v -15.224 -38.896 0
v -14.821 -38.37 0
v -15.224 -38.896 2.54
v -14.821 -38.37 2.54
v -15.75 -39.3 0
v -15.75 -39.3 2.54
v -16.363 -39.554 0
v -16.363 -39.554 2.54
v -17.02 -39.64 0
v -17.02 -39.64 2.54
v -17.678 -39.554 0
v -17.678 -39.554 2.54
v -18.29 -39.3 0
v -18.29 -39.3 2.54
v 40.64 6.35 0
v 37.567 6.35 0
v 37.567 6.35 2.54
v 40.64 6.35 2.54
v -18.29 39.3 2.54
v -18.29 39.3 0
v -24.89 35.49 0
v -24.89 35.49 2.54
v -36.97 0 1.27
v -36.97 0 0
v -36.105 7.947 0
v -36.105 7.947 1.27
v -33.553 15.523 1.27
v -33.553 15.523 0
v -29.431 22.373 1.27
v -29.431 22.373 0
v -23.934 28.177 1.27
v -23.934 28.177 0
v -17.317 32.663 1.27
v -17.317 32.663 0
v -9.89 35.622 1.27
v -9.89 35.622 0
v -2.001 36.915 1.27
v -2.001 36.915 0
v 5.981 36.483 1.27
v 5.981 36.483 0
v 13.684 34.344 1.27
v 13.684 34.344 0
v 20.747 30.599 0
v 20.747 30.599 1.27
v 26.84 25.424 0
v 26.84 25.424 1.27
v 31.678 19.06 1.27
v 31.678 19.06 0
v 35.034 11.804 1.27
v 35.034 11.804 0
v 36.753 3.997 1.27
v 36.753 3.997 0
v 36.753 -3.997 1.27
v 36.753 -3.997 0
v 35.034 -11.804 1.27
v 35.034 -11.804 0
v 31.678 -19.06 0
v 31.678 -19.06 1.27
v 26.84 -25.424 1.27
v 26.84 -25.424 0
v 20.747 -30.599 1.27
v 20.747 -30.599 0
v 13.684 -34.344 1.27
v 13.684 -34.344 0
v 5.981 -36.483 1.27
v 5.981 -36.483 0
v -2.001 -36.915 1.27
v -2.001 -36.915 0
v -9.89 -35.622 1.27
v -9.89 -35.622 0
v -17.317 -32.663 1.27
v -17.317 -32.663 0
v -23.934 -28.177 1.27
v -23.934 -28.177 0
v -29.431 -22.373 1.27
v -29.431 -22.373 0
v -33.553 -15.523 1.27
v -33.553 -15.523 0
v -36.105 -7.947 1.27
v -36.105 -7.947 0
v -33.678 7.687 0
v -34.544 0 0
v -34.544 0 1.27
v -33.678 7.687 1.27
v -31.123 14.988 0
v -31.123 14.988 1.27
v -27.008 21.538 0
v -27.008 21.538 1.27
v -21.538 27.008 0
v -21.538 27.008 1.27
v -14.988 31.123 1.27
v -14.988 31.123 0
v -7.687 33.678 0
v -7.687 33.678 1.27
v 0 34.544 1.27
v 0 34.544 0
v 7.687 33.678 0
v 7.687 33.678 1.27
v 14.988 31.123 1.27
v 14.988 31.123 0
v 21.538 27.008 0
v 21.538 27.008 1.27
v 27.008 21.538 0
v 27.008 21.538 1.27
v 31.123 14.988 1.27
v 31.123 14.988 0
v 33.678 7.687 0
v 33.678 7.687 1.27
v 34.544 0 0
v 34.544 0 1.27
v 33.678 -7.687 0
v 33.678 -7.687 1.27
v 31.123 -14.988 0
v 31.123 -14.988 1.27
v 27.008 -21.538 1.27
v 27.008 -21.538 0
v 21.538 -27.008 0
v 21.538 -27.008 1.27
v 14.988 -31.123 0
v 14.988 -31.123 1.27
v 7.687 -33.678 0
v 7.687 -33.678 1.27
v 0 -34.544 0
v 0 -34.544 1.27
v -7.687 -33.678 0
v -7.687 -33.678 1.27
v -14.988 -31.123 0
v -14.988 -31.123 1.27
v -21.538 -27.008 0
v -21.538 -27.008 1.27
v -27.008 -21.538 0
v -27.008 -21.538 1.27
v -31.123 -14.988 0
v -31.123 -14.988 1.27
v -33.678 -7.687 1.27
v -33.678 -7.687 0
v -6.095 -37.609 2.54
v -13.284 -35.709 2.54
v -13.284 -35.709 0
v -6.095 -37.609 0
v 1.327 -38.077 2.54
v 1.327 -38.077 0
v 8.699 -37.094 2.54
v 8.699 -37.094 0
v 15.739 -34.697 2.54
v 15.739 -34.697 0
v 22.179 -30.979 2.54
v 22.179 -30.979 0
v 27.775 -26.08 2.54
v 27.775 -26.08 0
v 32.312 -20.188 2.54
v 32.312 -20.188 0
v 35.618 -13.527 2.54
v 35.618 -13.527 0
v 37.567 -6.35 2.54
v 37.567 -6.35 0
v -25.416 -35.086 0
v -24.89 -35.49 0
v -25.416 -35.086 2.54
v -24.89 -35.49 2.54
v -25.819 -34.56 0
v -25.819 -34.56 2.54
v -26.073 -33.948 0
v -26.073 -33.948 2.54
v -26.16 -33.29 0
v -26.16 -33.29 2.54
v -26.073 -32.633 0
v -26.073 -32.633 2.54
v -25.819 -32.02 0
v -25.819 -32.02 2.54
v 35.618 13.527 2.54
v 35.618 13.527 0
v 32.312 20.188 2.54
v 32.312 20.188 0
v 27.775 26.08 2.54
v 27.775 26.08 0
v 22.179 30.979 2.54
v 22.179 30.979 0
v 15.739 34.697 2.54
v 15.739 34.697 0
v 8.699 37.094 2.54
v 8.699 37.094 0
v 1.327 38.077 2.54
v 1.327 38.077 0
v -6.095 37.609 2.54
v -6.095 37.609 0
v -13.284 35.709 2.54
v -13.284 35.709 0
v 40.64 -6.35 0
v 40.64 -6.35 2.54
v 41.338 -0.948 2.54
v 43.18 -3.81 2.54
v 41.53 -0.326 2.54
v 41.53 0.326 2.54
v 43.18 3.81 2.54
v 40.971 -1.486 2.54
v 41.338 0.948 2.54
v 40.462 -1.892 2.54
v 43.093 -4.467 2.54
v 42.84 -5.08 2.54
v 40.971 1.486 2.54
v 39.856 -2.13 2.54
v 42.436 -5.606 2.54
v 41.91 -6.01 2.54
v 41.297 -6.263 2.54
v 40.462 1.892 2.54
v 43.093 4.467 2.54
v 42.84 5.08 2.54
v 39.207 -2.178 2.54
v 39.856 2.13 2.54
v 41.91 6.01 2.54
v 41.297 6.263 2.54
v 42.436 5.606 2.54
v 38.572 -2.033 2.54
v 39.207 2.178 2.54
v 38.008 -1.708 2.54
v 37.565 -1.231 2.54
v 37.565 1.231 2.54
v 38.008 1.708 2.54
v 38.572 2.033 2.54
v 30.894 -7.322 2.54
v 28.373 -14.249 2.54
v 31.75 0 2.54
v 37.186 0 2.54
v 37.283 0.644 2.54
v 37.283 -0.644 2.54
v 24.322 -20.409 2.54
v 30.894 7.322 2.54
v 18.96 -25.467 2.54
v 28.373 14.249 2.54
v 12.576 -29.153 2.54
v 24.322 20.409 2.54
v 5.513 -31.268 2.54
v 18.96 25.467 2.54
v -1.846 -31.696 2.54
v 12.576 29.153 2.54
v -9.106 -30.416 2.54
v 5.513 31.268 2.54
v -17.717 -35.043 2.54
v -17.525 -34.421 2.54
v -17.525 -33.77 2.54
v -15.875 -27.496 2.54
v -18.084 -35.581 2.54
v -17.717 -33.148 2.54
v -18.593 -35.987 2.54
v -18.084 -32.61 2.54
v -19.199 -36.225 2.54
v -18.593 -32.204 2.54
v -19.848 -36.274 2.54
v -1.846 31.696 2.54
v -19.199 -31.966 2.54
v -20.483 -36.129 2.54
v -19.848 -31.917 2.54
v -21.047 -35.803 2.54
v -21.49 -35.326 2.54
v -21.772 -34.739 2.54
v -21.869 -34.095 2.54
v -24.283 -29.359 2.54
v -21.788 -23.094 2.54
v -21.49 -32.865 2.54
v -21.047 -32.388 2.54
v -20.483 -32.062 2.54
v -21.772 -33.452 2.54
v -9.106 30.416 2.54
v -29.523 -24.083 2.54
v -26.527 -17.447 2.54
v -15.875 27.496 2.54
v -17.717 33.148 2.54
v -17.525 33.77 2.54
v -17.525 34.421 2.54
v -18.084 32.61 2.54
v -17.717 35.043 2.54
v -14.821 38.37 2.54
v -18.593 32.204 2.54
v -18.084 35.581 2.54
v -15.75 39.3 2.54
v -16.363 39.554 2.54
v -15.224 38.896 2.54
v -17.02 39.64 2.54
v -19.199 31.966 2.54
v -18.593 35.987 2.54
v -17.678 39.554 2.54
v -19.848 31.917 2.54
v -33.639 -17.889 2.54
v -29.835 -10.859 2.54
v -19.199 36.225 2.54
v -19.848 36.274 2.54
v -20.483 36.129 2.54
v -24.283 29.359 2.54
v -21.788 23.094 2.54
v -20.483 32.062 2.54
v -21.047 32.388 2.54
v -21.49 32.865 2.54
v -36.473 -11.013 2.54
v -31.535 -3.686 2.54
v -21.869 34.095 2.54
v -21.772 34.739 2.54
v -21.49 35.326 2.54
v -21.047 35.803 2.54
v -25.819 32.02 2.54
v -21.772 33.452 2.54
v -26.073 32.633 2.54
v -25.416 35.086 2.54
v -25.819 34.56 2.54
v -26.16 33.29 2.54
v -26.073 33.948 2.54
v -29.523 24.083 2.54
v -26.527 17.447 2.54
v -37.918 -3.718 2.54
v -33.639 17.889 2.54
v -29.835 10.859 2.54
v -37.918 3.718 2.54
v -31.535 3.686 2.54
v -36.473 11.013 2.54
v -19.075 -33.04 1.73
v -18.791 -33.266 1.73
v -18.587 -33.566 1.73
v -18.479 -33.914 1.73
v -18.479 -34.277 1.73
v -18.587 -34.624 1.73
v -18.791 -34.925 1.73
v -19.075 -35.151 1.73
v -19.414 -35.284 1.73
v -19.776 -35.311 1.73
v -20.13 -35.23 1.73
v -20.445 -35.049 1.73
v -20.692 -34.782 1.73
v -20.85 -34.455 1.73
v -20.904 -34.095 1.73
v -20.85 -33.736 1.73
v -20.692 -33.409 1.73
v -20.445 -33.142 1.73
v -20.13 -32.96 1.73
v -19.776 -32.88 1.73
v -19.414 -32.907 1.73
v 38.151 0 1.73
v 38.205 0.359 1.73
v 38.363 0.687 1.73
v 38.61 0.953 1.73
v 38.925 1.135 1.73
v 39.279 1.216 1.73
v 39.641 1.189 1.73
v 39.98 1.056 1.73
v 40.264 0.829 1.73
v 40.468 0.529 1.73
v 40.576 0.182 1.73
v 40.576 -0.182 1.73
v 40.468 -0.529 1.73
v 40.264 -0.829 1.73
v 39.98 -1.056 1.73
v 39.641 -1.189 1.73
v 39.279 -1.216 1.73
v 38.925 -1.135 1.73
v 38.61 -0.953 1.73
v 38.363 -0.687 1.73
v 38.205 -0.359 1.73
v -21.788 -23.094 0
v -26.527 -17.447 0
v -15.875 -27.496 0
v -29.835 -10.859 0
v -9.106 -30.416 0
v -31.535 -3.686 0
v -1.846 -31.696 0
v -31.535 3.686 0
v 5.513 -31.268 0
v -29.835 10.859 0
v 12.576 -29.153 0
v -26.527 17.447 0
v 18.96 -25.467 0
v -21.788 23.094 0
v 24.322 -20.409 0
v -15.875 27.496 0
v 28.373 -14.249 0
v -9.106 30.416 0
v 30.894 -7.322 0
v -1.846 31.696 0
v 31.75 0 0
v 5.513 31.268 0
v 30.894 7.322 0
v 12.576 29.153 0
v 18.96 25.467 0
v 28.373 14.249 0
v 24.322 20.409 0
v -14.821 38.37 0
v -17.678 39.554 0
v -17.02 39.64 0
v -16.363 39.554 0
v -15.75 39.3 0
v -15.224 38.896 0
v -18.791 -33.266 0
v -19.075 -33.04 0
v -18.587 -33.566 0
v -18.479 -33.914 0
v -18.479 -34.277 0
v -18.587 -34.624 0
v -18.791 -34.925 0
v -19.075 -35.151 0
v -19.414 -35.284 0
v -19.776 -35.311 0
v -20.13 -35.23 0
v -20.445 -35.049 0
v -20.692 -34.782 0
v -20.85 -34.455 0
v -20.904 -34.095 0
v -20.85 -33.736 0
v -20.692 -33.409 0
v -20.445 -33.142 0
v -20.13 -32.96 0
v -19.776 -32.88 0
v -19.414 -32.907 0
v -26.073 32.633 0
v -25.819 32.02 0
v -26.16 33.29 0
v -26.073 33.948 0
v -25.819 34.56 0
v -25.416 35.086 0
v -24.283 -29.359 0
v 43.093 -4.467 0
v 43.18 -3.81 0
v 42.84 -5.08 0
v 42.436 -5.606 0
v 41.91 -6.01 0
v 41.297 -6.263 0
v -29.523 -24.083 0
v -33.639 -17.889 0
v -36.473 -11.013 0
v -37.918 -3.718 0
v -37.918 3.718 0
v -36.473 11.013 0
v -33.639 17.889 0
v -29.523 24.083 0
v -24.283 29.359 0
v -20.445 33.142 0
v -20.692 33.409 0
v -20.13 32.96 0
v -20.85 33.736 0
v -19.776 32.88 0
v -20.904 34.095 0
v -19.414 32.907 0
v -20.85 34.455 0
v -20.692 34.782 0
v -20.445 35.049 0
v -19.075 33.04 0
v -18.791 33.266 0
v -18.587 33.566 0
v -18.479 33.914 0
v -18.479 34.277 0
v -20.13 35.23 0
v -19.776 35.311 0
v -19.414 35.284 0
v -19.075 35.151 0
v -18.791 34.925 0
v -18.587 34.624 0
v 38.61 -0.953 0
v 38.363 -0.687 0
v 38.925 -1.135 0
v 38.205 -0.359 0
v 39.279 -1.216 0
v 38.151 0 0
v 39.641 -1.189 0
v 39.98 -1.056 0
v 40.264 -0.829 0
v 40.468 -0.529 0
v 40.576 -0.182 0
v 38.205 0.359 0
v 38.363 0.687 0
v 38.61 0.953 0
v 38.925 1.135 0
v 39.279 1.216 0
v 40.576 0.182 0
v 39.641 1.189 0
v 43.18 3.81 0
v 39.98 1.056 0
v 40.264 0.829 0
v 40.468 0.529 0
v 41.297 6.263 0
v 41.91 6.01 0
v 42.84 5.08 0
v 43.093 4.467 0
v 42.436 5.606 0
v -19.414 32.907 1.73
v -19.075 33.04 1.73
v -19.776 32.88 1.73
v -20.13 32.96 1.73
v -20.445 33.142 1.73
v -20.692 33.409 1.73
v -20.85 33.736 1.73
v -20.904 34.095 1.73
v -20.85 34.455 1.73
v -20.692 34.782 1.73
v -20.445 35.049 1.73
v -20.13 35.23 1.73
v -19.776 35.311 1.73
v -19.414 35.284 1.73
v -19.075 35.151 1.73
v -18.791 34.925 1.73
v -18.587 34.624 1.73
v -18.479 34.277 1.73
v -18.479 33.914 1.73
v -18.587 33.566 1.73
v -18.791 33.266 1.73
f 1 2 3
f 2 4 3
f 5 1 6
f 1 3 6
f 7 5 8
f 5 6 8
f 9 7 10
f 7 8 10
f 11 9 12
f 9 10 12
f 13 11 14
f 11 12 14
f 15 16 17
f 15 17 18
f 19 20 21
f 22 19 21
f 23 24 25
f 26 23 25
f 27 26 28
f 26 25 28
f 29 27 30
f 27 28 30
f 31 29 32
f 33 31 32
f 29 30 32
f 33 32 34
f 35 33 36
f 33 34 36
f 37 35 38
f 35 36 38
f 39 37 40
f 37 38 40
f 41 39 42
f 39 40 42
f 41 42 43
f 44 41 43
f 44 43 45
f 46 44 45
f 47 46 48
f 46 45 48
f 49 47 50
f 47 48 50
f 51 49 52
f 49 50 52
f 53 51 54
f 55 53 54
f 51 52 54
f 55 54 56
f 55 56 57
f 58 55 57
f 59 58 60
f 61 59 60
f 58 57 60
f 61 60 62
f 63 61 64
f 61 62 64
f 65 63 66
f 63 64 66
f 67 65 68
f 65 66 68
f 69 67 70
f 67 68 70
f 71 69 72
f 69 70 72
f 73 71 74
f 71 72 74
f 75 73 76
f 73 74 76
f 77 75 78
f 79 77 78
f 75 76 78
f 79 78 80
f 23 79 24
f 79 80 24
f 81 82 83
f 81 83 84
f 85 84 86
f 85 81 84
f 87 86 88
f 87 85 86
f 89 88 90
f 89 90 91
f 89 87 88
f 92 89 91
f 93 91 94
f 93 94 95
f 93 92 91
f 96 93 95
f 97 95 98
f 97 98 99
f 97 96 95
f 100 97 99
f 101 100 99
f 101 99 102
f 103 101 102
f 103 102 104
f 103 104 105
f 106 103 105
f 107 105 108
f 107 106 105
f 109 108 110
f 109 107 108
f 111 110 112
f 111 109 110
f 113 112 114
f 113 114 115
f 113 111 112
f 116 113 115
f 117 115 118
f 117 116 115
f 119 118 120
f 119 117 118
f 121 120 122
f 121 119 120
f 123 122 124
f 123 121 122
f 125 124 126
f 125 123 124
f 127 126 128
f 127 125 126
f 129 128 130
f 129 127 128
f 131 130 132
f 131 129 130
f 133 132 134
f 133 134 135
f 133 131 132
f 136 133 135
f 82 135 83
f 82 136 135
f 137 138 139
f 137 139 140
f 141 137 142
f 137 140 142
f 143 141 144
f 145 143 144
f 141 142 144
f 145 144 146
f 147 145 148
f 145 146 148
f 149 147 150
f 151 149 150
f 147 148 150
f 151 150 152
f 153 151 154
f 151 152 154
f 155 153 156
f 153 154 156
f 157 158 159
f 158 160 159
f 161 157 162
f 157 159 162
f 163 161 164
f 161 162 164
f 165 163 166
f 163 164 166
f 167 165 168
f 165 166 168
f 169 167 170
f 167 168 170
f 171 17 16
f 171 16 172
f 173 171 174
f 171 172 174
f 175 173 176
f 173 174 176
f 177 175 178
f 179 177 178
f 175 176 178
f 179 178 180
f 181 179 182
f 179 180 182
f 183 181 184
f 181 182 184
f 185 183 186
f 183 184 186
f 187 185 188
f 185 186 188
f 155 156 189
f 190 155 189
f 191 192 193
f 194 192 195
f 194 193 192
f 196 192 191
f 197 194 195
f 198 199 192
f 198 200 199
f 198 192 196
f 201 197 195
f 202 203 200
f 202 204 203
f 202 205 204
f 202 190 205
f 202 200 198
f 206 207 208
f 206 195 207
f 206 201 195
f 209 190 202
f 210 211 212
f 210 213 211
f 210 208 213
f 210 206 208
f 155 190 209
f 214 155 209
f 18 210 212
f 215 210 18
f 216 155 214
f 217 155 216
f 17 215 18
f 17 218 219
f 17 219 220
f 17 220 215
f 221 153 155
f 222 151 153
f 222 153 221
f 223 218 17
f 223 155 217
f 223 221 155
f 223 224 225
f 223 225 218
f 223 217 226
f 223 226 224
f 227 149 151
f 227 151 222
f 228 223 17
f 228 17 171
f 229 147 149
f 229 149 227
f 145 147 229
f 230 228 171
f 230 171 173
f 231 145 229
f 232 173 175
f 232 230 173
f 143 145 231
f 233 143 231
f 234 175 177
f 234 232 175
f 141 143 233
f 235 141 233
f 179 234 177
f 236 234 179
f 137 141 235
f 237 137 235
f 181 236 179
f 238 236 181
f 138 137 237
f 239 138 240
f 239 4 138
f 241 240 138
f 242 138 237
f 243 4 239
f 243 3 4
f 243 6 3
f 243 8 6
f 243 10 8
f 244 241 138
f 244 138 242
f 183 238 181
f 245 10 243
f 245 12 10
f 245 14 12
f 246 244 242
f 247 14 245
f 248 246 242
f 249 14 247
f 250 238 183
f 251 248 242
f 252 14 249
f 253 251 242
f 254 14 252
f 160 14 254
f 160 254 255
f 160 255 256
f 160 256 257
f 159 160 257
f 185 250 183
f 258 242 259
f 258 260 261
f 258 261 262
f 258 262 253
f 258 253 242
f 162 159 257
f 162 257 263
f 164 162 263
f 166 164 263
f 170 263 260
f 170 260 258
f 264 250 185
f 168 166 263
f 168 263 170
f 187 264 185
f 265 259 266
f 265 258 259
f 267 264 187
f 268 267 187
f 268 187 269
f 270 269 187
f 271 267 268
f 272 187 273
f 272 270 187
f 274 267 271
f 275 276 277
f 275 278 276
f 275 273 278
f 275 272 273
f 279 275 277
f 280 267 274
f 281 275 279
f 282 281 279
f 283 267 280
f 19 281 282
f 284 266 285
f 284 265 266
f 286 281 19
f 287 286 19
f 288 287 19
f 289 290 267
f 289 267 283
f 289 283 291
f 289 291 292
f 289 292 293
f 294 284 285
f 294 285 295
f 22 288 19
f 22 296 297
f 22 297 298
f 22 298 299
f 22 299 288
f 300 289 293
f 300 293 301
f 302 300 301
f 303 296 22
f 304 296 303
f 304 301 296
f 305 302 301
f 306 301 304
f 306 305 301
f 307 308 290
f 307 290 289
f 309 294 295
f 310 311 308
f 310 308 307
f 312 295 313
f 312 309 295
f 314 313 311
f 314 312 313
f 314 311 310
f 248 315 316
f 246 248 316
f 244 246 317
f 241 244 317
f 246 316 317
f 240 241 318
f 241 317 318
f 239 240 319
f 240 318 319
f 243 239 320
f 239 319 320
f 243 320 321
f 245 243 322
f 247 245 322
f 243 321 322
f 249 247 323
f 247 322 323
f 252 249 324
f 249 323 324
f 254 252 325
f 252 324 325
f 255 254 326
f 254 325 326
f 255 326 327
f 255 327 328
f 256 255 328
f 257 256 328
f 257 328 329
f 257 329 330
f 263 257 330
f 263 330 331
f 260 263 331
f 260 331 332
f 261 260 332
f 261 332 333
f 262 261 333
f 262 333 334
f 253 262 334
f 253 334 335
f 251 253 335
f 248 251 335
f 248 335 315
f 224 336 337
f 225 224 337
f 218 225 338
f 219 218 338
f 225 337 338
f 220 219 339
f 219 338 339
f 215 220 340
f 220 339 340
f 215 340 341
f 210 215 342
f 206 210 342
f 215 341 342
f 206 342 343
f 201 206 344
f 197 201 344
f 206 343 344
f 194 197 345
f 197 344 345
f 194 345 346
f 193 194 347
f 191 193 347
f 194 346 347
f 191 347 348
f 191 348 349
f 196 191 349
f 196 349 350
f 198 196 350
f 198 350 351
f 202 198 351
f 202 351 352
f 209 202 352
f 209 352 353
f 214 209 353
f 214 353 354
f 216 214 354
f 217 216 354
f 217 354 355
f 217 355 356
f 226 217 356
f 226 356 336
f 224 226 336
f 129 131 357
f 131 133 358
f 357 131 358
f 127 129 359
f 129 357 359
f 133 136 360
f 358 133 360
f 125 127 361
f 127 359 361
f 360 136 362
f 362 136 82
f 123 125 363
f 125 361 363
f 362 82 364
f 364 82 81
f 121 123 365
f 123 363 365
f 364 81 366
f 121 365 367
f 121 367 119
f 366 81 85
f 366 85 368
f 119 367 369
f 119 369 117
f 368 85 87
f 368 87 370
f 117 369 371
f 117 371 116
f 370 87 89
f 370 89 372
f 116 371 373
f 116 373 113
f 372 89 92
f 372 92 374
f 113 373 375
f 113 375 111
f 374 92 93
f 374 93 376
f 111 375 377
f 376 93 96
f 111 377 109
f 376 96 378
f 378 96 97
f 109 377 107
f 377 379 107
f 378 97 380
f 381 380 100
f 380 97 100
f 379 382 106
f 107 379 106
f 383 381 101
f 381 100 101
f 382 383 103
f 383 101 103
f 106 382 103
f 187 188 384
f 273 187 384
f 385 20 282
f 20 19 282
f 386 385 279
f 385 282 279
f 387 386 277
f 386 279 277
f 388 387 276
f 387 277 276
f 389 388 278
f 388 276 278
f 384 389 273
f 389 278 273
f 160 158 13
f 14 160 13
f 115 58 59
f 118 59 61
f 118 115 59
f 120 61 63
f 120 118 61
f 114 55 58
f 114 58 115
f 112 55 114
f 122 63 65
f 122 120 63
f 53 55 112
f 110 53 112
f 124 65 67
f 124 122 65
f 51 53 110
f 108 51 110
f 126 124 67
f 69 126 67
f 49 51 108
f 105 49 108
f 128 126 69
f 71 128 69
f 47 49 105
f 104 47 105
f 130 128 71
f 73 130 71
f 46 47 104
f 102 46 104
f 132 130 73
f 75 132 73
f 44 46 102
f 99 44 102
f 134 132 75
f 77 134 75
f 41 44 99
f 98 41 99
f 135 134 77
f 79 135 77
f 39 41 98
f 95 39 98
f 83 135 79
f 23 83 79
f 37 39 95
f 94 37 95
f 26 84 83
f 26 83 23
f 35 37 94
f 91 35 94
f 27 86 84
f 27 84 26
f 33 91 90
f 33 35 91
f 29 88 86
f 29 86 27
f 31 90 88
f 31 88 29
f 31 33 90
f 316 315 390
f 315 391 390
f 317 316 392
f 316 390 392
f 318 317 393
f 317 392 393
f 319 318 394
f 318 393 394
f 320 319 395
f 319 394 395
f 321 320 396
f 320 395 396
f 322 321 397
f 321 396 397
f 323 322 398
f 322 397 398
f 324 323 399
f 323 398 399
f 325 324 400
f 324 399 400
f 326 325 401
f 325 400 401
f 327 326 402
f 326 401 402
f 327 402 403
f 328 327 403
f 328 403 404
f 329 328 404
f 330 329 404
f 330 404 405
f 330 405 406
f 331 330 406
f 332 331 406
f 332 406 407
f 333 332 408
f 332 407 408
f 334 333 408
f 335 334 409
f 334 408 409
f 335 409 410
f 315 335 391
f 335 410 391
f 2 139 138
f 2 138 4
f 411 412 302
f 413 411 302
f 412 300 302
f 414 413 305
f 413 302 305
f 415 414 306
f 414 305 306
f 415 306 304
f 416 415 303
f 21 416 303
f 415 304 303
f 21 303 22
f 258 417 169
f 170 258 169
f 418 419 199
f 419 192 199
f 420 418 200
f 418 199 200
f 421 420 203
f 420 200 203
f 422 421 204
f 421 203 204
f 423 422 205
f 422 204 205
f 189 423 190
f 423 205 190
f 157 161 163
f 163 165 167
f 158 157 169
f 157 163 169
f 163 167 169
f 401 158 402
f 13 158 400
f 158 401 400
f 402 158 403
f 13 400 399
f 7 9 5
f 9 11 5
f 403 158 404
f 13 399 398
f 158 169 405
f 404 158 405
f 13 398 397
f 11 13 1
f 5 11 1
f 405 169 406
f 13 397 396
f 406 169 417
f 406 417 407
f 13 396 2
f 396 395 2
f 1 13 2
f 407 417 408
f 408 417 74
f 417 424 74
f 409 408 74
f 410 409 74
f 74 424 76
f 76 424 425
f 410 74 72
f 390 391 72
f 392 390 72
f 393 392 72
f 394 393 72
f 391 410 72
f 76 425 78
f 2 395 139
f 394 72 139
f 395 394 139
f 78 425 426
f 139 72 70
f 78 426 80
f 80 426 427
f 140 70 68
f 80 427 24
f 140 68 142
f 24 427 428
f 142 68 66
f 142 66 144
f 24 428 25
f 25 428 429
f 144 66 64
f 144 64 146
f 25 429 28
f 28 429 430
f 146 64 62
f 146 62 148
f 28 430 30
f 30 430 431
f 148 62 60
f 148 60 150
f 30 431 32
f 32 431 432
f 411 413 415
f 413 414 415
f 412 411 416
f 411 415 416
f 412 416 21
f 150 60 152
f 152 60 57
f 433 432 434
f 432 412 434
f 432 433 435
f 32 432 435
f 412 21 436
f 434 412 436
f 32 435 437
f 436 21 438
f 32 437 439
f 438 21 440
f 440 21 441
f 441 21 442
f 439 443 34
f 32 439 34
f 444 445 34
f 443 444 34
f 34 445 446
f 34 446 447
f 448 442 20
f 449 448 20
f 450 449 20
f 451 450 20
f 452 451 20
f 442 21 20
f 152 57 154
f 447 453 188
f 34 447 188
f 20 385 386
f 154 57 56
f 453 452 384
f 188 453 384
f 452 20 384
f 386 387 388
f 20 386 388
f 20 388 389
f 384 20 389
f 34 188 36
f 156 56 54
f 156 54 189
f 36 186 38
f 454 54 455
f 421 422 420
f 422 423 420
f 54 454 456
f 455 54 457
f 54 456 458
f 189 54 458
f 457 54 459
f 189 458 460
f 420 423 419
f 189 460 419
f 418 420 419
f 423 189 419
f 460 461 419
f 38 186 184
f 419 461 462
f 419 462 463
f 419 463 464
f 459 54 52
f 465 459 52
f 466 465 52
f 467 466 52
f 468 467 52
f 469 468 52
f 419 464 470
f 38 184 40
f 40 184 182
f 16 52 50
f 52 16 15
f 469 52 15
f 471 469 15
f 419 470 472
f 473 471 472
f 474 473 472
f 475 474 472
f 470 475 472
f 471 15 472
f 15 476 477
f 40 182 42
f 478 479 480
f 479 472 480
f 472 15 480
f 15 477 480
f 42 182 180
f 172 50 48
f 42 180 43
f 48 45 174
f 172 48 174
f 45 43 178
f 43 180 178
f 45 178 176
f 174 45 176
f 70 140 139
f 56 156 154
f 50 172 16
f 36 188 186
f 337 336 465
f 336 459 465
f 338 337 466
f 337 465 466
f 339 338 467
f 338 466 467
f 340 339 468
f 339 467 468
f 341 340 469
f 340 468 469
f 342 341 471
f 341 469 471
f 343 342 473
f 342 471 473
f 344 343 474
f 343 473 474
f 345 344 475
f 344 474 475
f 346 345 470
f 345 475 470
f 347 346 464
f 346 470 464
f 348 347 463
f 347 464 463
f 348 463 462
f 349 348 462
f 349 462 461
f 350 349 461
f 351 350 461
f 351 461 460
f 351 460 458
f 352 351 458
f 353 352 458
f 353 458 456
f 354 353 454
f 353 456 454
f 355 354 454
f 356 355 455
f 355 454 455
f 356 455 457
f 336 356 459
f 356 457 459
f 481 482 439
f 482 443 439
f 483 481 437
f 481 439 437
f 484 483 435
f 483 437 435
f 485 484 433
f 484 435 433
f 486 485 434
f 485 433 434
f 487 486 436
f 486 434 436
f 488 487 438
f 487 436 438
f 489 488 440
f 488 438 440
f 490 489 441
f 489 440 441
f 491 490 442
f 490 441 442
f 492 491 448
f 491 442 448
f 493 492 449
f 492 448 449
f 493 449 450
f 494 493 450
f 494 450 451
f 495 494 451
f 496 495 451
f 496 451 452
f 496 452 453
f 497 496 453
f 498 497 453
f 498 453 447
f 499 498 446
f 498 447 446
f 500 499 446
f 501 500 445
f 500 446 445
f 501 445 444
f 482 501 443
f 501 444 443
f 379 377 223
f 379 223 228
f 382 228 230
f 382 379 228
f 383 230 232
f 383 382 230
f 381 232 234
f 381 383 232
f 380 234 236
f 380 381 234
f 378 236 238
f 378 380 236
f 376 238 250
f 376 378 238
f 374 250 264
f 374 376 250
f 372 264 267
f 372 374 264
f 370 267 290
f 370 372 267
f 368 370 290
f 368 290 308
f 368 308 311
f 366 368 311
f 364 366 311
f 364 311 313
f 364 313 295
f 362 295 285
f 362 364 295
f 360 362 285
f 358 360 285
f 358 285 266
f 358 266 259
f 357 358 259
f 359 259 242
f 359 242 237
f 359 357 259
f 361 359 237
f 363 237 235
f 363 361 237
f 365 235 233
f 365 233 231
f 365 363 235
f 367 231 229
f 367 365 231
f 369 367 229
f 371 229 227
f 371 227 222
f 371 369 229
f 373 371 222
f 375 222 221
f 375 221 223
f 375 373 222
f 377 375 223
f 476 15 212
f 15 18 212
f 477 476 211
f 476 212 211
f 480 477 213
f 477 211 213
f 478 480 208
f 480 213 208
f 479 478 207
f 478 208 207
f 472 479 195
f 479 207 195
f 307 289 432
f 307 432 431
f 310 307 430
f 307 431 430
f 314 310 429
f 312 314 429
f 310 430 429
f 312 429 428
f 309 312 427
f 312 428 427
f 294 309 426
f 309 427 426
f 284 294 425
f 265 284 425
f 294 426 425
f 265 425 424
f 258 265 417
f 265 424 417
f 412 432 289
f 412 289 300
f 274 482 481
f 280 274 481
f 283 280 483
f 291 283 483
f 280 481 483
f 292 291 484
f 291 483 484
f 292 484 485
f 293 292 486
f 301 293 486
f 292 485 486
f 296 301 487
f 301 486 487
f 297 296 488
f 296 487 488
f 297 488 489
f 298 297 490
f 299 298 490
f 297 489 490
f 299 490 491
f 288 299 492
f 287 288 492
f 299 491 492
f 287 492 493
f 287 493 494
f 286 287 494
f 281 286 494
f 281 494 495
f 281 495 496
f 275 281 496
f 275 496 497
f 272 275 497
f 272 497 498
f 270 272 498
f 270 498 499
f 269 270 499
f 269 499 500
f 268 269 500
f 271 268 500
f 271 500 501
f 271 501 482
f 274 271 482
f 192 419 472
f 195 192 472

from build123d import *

# Parameters (mm, degrees)
SKETCH1_R                                         = 38.1
SKETCH1_R_2                                       = 31.75
BOSS_EXTRUDE1_DEPTH                               = 2.54
SKETCH2_W                                         = 10.16
SKETCH2_H                                         = 12.7
BOSS_EXTRUDE2_DEPTH                               = 2.54
FILLET1_R                                         = 2.54
SKETCH3_R                                         = 0.635
CUT_EXTRUDE1_DEPTH                                = 3.54
CSK_FOR_2_FLAT_HEAD_MACHINE_SCREW_100_D           = 2.4384
CSK_FOR_2_FLAT_HEAD_MACHINE_SCREW_100_CSINK_D     = 4.3688
CSK_FOR_2_FLAT_HEAD_MACHINE_SCREW_100_CSINK_ANGLE = 100
CIRPATTERN1_COUNT                                 = 3
FILLET1_OF_CIRPATTERN1_R                          = 2.54
SKETCH6_R                                         = 36.9697
SKETCH6_R_2                                       = 34.544
CUT_EXTRUDE3_DEPTH                                = 1.27


with BuildPart() as part:
    # Sketch1 → Boss-Extrude1 (new body)
    with BuildSketch(Plane.XY):
        Circle(SKETCH1_R)
        Circle(SKETCH1_R_2, mode=Mode.SUBTRACT)
    extrude(amount=BOSS_EXTRUDE1_DEPTH)

    # Sketch2 → Boss-Extrude2 (add)
    with BuildSketch(Plane.XY):
        with Locations((38.1, 0)):
            Rectangle(SKETCH2_W, SKETCH2_H)
    boss_extrude2 = extrude(amount=BOSS_EXTRUDE2_DEPTH)

    # Fillet1
    fillet1_edges = [part.edges().sort_by_distance(p)[0] for p in [
        (43.18, 6.35, 1.27),
        (43.18, -6.35, 1.27),
    ]]
    fillet(fillet1_edges, radius=FILLET1_R)

    # Sketch3 → Cut-Extrude1 (cut, through all)
    with BuildSketch(Plane.XY.offset(2.54)):
        with Locations((39.37, 0)):
            Circle(SKETCH3_R)
    cut_extrude1 = extrude(amount=-CUT_EXTRUDE1_DEPTH, mode=Mode.SUBTRACT)

    # CSK for #2 Flat Head Machine Screw (100)1 (through all)
    with Locations(Plane.XY.offset(2.54)):
        with Locations((39.37, 0)):
            csk_for_2_flat_head_machine_screw_100 = CounterSinkHole(CSK_FOR_2_FLAT_HEAD_MACHINE_SCREW_100_D / 2, CSK_FOR_2_FLAT_HEAD_MACHINE_SCREW_100_CSINK_D / 2, counter_sink_angle=CSK_FOR_2_FLAT_HEAD_MACHINE_SCREW_100_CSINK_ANGLE)

    # CirPattern1: Boss-Extrude2, Cut-Extrude1, CSK for #2 Flat Head Machine Screw (100)1 ×3 about axis
    cirpattern1_axis = Axis((0, 0, 0), (0, 0, 1))
    for i in range(1, CIRPATTERN1_COUNT):
        add(boss_extrude2.rotate(cirpattern1_axis, i * 360 / CIRPATTERN1_COUNT))
        add(cut_extrude1.rotate(cirpattern1_axis, i * 360 / CIRPATTERN1_COUNT), mode=Mode.SUBTRACT)
        add(csk_for_2_flat_head_machine_screw_100.rotate(cirpattern1_axis, i * 360 / CIRPATTERN1_COUNT), mode=Mode.SUBTRACT)

    # Fillet1 of CirPattern1
    fillet1_of_cirpattern1_edges = [part.edges().sort_by_distance(p)[0] for p in [
        (-27.089261314, 34.219976935, 1.27),
        (-16.090738686, 40.569976935, 1.27),
        (-16.090738686, -40.569976935, 1.27),
        (-27.089261314, -34.219976935, 1.27),
    ]]
    fillet(fillet1_of_cirpattern1_edges, radius=FILLET1_OF_CIRPATTERN1_R)

    # Sketch6 → Cut-Extrude3 (cut)
    with BuildSketch(Plane(origin=(0, 0, 0), x_dir=(-1, 0, 0), z_dir=(0, 0, -1))):
        Circle(SKETCH6_R)
        Circle(SKETCH6_R_2, mode=Mode.SUBTRACT)
    extrude(amount=-CUT_EXTRUDE3_DEPTH, mode=Mode.SUBTRACT)


solid = part.part
